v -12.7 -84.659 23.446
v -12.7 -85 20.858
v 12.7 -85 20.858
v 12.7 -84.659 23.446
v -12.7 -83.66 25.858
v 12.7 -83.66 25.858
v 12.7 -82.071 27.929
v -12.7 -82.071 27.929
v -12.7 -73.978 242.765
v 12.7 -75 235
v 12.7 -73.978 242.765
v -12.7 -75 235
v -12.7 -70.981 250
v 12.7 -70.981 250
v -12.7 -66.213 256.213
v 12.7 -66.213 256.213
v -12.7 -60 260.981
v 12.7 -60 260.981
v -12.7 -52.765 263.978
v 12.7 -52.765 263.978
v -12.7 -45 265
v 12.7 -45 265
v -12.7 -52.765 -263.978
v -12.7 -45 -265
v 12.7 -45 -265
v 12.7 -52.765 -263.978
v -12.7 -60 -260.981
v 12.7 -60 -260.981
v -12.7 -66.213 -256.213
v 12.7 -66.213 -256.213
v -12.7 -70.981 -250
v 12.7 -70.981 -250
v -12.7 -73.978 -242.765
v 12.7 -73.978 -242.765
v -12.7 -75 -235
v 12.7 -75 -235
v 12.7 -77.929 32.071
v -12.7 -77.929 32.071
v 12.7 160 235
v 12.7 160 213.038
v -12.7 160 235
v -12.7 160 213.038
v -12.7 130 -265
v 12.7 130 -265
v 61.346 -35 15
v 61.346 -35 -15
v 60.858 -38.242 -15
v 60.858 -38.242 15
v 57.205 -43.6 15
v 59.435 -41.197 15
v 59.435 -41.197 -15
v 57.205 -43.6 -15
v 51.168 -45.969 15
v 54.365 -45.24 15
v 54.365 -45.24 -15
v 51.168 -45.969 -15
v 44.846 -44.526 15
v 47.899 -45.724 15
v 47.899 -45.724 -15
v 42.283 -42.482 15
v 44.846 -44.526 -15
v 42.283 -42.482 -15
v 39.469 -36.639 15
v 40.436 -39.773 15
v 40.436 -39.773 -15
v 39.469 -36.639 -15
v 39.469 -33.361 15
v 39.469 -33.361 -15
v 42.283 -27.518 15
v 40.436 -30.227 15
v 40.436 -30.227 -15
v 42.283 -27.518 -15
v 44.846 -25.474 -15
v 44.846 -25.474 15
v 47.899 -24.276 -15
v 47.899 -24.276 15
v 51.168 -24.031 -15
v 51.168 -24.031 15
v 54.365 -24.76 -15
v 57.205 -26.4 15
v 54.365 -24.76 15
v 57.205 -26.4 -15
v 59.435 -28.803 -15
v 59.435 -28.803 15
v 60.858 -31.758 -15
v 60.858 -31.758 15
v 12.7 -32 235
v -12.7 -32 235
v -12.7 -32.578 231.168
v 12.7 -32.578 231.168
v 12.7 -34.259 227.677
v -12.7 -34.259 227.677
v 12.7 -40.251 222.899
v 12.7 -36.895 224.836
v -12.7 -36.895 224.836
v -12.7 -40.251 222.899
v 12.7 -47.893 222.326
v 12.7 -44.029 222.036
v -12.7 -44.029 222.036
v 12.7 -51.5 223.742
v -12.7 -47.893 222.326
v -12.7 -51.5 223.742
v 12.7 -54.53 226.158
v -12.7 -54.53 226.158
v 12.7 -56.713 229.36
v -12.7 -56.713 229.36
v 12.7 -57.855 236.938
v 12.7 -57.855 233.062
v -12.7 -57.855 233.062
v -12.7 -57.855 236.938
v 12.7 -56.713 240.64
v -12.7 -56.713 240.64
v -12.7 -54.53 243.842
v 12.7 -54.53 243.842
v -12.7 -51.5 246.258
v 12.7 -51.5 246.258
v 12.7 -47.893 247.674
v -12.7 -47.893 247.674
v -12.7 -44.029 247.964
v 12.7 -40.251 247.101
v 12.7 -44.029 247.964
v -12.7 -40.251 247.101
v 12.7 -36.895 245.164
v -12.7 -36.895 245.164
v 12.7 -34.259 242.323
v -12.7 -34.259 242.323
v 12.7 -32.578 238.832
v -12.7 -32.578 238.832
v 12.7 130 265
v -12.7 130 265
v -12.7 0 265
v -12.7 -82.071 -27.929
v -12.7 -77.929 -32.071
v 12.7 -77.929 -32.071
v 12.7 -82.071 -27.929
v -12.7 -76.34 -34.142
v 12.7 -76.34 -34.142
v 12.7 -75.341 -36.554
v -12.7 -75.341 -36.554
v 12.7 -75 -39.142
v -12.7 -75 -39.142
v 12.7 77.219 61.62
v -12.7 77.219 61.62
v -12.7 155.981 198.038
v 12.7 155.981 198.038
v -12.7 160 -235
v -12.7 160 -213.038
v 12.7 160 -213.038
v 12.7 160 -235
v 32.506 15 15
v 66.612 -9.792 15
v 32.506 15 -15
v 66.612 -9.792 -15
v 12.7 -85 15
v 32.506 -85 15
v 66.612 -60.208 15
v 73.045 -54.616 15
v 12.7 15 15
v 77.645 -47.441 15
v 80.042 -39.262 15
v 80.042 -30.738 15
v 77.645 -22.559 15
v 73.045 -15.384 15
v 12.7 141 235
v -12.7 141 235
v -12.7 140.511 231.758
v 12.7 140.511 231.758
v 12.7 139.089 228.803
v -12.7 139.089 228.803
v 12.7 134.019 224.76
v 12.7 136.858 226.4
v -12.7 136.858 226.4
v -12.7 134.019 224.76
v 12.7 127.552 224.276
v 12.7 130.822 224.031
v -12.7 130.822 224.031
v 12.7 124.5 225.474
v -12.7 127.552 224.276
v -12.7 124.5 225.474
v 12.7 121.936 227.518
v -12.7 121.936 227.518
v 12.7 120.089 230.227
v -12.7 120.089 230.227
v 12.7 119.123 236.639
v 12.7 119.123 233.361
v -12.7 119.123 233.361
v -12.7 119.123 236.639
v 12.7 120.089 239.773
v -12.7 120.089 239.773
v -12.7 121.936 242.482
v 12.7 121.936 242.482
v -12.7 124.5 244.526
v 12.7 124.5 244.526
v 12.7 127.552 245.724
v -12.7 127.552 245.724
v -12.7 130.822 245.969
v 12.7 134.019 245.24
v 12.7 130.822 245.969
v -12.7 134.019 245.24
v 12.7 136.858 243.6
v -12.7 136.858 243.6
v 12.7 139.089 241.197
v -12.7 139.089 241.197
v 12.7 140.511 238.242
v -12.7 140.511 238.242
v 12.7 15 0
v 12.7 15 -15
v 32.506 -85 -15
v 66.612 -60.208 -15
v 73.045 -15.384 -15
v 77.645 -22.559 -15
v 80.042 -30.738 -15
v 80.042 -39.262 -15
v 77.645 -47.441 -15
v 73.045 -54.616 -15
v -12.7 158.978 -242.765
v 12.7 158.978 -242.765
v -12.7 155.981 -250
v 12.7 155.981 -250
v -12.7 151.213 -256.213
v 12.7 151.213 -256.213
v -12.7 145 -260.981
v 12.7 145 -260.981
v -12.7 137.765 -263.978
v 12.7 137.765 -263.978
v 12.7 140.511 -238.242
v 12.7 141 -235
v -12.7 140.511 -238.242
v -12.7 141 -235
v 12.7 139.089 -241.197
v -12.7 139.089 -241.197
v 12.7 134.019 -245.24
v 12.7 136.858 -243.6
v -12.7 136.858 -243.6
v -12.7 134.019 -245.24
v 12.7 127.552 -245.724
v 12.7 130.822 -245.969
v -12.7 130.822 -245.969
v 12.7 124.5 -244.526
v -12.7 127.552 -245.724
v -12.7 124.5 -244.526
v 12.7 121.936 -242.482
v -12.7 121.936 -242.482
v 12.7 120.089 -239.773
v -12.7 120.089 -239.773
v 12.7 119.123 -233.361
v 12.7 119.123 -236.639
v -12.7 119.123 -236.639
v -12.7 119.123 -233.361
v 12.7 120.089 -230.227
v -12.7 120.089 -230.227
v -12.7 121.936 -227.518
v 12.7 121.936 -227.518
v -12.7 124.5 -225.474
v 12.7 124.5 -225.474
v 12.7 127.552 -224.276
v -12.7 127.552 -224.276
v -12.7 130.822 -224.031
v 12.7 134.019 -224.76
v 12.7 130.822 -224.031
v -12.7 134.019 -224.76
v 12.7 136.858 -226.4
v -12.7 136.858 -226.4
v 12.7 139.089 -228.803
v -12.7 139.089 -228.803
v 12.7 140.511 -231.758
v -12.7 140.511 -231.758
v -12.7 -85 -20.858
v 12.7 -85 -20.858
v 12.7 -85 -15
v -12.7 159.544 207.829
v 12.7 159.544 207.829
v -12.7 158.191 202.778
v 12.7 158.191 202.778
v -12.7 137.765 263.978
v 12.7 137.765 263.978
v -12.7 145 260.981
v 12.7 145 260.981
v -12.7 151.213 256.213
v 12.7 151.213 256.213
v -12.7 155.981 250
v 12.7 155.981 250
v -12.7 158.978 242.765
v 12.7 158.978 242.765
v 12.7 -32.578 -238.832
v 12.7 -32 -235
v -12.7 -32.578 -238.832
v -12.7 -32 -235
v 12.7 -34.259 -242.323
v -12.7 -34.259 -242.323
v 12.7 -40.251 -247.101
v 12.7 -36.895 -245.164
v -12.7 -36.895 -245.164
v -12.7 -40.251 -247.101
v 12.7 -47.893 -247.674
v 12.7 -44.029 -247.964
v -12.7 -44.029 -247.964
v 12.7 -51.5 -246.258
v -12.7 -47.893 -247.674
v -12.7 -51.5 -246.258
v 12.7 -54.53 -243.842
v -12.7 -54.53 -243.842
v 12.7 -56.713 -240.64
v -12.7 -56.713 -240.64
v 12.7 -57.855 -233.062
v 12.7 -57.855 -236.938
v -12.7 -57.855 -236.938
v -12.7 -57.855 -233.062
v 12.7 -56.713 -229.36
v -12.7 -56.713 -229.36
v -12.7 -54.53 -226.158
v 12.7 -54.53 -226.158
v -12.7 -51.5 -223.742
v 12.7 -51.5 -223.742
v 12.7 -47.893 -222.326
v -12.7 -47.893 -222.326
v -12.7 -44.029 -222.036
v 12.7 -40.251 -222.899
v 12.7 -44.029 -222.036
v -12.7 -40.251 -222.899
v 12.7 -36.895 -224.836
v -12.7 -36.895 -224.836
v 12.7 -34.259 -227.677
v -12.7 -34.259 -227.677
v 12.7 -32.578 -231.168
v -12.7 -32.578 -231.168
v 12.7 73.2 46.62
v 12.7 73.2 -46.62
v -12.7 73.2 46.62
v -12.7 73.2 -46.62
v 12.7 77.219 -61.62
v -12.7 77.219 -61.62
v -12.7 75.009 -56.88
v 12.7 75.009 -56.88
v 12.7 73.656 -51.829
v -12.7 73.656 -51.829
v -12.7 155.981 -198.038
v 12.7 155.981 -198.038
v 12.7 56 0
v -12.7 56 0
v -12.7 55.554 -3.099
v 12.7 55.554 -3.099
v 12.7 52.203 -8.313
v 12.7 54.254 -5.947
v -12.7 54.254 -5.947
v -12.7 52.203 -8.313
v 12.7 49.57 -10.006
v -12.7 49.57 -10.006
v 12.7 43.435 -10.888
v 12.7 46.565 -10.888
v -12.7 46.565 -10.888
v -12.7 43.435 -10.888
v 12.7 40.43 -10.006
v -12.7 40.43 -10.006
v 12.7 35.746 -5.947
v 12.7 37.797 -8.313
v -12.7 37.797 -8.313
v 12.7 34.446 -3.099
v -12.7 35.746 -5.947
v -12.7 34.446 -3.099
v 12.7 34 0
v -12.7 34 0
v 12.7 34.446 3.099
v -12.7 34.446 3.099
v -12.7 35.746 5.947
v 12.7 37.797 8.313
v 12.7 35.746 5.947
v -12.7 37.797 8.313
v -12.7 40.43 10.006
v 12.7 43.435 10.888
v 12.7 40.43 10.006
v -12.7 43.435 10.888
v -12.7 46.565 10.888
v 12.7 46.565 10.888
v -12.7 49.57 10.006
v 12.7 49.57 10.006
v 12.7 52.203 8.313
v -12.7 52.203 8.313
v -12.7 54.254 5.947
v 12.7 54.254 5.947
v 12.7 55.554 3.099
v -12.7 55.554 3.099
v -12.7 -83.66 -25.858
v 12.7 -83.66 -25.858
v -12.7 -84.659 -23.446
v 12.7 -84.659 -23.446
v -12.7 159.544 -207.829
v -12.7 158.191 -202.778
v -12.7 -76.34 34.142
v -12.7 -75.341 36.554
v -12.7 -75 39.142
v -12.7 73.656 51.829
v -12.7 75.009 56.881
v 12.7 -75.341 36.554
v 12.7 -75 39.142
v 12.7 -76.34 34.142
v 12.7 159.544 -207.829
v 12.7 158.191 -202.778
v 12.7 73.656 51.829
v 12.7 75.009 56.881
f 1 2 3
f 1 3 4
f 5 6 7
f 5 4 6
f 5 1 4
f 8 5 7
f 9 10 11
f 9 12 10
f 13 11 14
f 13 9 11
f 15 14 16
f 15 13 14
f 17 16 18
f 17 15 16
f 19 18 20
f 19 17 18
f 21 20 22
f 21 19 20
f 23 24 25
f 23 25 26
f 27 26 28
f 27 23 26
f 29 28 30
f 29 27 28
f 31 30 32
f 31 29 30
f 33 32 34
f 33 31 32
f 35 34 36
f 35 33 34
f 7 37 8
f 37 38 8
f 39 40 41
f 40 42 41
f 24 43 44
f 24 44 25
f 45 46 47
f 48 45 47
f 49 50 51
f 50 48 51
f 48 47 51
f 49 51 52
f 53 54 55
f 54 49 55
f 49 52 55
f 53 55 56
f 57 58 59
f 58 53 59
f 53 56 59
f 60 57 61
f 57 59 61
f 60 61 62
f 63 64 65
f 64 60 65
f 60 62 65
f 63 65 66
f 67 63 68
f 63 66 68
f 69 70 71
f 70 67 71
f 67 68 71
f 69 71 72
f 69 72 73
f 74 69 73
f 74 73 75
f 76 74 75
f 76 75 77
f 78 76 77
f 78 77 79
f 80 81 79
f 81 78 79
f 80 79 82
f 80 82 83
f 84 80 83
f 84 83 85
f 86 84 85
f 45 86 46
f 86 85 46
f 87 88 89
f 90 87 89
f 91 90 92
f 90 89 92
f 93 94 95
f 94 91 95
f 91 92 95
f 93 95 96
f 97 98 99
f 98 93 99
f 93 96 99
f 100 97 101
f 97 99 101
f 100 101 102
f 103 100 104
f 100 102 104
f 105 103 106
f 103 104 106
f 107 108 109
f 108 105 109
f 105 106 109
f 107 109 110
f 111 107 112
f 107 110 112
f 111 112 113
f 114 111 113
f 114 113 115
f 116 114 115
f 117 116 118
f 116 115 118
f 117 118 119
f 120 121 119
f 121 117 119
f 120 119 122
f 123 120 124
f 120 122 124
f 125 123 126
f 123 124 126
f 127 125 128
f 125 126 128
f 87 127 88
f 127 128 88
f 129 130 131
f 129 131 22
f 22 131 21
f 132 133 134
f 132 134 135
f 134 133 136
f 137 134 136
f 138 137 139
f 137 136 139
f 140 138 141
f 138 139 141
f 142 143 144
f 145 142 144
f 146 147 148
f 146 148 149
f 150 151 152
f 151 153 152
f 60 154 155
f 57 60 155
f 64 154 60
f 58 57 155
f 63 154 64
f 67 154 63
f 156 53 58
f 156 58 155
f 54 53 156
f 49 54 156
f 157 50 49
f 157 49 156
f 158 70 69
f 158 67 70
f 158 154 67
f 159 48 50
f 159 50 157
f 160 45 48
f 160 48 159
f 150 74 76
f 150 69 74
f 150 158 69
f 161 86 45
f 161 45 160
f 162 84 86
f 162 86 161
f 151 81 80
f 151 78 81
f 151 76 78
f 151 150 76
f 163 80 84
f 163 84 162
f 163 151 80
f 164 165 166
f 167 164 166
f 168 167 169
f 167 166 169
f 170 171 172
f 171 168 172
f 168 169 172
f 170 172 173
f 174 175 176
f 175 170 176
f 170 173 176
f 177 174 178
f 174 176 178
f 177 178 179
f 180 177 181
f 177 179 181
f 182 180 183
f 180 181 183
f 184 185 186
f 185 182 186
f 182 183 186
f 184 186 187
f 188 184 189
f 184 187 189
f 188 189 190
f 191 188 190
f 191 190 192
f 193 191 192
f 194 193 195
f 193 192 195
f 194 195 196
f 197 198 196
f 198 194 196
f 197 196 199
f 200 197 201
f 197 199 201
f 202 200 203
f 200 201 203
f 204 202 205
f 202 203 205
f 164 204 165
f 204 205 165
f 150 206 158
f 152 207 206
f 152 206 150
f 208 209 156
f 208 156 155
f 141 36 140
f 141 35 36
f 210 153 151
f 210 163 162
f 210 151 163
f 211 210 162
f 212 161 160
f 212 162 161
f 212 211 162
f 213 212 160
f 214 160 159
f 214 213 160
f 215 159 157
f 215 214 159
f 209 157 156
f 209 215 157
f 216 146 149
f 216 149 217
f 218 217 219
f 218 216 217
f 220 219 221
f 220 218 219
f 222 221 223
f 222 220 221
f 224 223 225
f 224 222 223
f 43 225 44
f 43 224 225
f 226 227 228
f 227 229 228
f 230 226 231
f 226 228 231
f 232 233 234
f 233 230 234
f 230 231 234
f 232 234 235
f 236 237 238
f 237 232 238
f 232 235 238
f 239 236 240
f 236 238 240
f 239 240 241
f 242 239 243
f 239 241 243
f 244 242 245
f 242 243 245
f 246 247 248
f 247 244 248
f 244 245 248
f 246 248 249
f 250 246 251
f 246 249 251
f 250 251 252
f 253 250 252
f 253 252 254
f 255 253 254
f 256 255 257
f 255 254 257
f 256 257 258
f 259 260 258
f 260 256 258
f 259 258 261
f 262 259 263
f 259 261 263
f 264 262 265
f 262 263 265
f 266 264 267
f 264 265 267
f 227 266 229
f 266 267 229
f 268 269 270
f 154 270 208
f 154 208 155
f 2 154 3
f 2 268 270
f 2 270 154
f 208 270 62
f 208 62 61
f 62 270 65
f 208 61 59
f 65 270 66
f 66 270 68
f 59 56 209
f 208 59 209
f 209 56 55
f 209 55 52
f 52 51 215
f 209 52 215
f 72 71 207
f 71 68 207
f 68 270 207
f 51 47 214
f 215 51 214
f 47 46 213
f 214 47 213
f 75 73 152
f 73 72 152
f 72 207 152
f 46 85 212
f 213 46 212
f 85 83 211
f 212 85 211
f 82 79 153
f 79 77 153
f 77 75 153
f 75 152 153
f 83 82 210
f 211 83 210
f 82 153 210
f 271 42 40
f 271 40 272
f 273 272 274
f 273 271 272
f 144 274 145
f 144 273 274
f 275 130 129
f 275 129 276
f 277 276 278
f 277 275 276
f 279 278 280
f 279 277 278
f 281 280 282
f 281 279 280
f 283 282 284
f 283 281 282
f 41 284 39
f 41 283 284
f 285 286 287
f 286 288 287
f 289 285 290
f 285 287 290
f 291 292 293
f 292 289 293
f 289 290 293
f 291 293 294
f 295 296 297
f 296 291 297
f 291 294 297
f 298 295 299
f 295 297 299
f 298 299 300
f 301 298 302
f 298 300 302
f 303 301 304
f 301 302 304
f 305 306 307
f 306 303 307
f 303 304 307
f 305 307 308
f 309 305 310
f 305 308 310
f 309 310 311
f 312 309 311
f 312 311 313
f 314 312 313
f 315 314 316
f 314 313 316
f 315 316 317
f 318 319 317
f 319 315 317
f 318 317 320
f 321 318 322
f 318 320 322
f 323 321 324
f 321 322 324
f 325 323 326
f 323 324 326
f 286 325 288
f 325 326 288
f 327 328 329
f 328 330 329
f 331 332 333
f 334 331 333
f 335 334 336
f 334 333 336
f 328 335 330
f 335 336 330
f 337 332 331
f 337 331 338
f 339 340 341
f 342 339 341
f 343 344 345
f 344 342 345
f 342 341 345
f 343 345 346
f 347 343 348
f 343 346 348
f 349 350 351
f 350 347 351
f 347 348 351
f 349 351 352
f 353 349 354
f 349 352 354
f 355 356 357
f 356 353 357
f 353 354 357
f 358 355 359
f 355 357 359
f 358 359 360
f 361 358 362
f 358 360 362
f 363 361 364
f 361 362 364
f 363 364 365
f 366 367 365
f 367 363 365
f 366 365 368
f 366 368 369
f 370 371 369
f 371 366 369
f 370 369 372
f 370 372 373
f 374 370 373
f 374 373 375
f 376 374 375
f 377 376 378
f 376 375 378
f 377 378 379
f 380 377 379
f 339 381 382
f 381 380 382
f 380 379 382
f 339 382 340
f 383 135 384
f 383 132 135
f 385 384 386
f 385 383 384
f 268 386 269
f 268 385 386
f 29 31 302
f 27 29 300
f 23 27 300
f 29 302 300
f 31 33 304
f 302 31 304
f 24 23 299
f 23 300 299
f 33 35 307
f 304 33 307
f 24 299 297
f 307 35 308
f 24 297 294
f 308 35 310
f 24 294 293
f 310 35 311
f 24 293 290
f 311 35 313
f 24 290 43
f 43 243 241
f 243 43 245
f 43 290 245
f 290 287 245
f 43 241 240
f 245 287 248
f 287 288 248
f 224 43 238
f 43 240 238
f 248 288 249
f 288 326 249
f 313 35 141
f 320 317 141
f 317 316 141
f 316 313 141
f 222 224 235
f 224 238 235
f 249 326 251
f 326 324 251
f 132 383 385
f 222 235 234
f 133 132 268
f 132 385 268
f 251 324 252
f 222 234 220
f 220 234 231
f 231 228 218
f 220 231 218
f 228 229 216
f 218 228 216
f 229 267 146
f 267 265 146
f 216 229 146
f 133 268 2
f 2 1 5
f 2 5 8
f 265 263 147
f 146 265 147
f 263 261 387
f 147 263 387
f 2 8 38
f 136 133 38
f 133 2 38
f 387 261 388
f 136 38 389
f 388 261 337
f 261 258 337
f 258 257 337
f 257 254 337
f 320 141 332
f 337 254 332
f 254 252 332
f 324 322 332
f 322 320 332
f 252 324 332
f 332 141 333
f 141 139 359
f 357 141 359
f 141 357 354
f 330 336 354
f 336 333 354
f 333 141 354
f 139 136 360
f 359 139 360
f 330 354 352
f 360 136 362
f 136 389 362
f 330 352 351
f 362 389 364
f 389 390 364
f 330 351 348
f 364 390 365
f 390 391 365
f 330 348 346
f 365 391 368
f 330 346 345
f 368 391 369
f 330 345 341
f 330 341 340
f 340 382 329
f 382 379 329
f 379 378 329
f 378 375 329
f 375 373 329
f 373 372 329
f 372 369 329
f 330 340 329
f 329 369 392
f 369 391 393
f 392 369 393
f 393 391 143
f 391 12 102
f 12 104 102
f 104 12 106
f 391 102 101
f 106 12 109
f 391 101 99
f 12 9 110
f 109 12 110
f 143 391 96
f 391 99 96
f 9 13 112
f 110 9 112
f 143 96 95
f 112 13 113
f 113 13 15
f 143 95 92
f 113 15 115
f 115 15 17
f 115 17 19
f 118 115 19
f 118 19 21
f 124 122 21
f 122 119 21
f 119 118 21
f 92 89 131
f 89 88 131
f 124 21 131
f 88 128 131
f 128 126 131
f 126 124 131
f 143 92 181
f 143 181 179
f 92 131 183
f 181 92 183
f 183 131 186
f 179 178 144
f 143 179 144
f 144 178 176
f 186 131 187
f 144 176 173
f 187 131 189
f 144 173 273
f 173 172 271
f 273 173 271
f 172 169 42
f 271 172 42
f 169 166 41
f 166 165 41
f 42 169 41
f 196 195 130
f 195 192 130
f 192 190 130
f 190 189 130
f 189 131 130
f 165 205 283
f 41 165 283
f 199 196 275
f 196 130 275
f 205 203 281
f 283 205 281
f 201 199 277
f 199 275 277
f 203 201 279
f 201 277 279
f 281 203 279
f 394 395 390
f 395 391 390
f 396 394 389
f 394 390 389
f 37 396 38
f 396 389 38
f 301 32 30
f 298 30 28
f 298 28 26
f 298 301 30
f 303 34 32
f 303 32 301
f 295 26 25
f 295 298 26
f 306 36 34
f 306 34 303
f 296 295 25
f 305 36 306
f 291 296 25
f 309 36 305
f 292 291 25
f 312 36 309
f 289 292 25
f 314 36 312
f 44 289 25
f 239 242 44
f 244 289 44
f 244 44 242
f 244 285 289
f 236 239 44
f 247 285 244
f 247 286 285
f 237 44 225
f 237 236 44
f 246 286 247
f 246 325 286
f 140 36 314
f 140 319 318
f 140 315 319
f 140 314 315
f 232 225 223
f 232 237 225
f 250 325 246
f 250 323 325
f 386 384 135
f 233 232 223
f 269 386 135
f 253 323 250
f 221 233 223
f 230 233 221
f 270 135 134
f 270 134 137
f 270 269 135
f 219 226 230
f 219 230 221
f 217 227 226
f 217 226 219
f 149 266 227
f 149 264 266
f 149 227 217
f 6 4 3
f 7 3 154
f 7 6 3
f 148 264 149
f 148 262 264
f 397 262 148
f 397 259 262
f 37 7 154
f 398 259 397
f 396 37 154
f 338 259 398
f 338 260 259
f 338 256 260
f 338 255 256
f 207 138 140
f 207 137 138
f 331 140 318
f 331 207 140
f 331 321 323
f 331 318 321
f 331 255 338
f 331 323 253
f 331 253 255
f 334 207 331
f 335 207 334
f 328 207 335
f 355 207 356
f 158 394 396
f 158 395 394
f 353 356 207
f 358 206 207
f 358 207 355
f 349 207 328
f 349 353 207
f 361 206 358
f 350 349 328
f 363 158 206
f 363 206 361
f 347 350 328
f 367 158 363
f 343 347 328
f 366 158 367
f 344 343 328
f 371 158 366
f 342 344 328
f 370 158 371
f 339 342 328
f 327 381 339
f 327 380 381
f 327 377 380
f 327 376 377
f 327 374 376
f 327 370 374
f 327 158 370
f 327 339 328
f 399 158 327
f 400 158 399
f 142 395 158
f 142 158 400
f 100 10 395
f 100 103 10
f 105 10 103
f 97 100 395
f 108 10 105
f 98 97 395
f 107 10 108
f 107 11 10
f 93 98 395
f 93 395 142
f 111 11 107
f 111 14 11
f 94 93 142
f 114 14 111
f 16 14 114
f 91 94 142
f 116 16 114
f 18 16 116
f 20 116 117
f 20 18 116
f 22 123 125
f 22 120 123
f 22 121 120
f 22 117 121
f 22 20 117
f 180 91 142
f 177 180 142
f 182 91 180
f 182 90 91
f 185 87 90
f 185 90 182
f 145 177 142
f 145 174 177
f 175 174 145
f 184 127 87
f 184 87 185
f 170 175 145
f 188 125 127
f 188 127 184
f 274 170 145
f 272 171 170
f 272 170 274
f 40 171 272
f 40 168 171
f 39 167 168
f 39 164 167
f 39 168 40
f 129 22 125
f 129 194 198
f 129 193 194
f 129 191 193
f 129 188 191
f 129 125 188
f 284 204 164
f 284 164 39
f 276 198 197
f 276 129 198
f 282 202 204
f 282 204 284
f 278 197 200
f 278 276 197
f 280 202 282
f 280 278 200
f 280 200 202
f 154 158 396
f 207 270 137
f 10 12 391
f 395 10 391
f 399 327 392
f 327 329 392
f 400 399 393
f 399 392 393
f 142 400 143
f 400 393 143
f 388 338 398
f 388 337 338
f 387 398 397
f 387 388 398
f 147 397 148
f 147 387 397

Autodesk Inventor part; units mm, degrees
ref_plane "YZ Plane" through (0, 0, 0) normal (1, 0, 0) x (0, 1, 0)
ref_plane "XZ Plane" through (0, 0, 0) normal (0, 1, 0) x (-1, 0, 0)
ref_plane "XY Plane" through (0, 0, 0) normal (0, 0, 1) x (1, 0, 0)
sketch "Sketch1" plane through (0, 0, 0) normal (1, 0, 0) x (0, 1, 0)
  circle A0 centre (45, 0) radius 11
  line L0 (45, 0) -> (0, 0)
  circle A1 centre (130, 235) radius 11
  line L1 (73.2002, 0) -> (73.2002, 46.6199)
  line L2 (77.2194, 61.6199) -> (155.9808, 198.0385)
  line L3 (160, 213.0385) -> (160, 235)
  arc A2 (160, 235) -> (130, 265) centre (130, 235) ccw
  line L4 (130, 235) -> (130, 265) construction
  line L5 (130, 235) -> (160, 235) construction
  line L6 (130, 265) -> (-45, 265)
  line L7 (0, 0) -> (0, 265)
  circle A3 centre (-45, 235) radius 13
  arc A4 (-45, 265) -> (-75, 235) centre (-45, 235) ccw
  line L8 (-45, 235) -> (-75, 235) construction
  line L9 (-45, 235) -> (-45, 265) construction
  line L10 (-75, 235) -> (-75, 39.1421)
  line L11 (0, 0) -> (-45, 0)
  circle A5 centre (130, -235) radius 11
  line L12 (73.2002, 0) -> (73.2002, -46.6199)
  line L13 (77.2194, -61.6199) -> (155.9808, -198.0385)
  line L14 (160, -213.0385) -> (160, -235)
  arc A6 (130, -265) -> (160, -235) centre (130, -235) ccw
  line L15 (130, -265) -> (-45, -265)
  circle A7 centre (-45, -235) radius 13
  arc A8 (-75, -235) -> (-45, -265) centre (-45, -235) ccw
  line L16 (-45, -235) -> (-75, -235) construction
  line L17 (-75, -235) -> (-75, -39.1421)
  arc A9 (155.9808, 198.0385) -> (160, 213.0385) centre (130, 213.0385) ccw
  arc A10 (77.2194, 61.6199) -> (73.2002, 46.6199) centre (103.2002, 46.6199) ccw
  arc A11 (73.2002, -46.6199) -> (77.2194, -61.6199) centre (103.2002, -46.6199) ccw
  arc A12 (160, -213.0385) -> (155.9808, -198.0385) centre (130, -213.0385) ccw
  line L18 (-77.9289, 32.0711) -> (-82.0711, 27.9289)
  line L19 (-85, 20.8579) -> (-85, 0)
  line L20 (-77.9289, -32.0711) -> (-82.0711, -27.9289)
  line L21 (-85, -20.8579) -> (-85, 0)
  arc A13 (-77.9289, 32.0711) -> (-75, 39.1421) centre (-85, 39.1421) ccw
  arc A14 (-82.0711, 27.9289) -> (-85, 20.8579) centre (-75, 20.8579) ccw
  arc A15 (-85, -20.8579) -> (-82.0711, -27.9289) centre (-75, -20.8579) ccw
  arc A16 (-75, -39.1421) -> (-77.9289, -32.0711) centre (-85, -39.1421) ccw
  point P0 (73.2002, 54.6584)
  point P1 (160, 205)
  point P2 (-75, -35)
  point P3 (48.2002, -10.5242)
  point P4 (73.2002, -54.6584)
  point P5 (160, -205)
  point P6 (-85, 25)
  point P7 (-75, 35)
  point P8 (-85, -25)
  dimension "d0" = 22
  dimension "d1" = 22
  dimension "d2" = 470
  dimension "d3" = 90
  dimension "d7" = 30
  dimension "d8" = 26
  dimension "d9" = 90
  dimension "d11" = 25
  dimension "d12" = 85
  dimension "d13" = 90
  dimension "d14" = 30
  dimension "d15" = 30
  dimension "d16" = 30
  dimension "d19" = 45
  dimension "d20" = 40
  dimension "d21" = 50
  dimension "d22" = 10
extrude "Extrusion1" add sketch "Sketch1" along normal mid plane 25.4
sketch "Sketch2" plane through (0, 0, 0) normal (0, 0, 1) x (1, 0, 0)
  line L0 (12.7, -45) -> (12.7, 130) projected
  line L1 (12.7, -85) -> (12.7, -82.0711) projected
  line L2 (12.7, -85) -> (12.7, 15)
  circle A0 centre (50.3463, -35) radius 11
  line L3 (12.7, 15) -> (32.5059, 15)
  line L4 (32.5059, 15) -> (53.1062, 15) construction
  arc A1 (66.6123, -60.2075) -> (66.6123, -9.7925) centre (50.3463, -35) ccw
  line L5 (66.6123, -9.7925) -> (32.5059, 15)
  line L6 (66.6123, -60.2075) -> (32.5059, -85)
  line L7 (32.5059, -85) -> (12.7, -85)
  point P0 (0, 0)
  dimension "d23" = 100
  dimension "d24" = 22
  dimension "d26" = 60
extrude "Extrusion2" add sketch "Sketch2" along normal mid plane 30
properties part number "Balancim_3-Cabos_Modelo2"
